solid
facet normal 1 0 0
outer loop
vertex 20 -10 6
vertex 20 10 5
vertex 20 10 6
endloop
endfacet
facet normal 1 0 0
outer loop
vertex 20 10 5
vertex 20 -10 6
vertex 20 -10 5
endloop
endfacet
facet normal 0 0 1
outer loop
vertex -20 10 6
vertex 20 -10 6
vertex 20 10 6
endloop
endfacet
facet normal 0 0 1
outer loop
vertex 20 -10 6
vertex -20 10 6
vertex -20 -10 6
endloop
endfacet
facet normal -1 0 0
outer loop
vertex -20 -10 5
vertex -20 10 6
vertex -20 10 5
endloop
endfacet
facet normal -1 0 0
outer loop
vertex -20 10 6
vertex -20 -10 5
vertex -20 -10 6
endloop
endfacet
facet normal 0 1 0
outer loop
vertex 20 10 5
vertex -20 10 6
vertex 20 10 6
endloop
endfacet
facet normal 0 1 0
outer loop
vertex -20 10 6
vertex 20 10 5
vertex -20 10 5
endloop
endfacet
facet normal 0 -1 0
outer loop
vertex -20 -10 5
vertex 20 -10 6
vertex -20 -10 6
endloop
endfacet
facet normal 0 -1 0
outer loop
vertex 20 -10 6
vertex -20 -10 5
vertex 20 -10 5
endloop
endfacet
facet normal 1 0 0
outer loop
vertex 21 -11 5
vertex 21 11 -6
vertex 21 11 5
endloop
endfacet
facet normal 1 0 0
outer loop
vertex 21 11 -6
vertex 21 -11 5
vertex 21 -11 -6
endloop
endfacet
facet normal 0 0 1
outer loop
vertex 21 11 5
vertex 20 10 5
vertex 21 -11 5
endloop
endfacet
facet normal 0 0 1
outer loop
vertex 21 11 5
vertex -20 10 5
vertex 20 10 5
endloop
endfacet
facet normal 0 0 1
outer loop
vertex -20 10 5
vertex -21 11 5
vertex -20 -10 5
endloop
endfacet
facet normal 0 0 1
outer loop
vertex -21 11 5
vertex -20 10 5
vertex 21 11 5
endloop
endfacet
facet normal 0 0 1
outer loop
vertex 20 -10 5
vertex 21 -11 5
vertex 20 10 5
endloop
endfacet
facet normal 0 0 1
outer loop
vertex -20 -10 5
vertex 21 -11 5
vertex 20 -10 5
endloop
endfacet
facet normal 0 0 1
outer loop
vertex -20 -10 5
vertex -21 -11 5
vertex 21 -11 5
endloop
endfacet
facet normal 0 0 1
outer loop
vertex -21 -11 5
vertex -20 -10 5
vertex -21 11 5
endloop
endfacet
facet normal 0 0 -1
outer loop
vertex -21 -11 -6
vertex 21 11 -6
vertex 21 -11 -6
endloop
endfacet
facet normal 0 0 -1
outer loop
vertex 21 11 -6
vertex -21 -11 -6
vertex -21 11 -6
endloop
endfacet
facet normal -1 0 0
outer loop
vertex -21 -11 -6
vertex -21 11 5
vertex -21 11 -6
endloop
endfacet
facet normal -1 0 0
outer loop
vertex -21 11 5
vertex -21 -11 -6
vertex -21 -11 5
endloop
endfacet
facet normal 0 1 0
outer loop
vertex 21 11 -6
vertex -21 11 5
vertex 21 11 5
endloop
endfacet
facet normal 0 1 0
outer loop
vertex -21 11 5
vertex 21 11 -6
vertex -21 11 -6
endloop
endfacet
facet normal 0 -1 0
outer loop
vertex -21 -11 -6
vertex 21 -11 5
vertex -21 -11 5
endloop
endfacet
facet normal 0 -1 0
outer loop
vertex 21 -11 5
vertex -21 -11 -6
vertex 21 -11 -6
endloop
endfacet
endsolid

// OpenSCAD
// Unit of length: Unit.MM
union()
{
   color(c = [1.0, 0.0, 0.0, 1.0])
   {
      translate(v = [0.0, 0.0, 0.5])
      {
         cube(size = [40.0, 20.0, 11.0], center = true);
      }
   }
   translate(v = [0.0, 0.0, -0.5])
   {
      cube(size = [42.0, 22.0, 11.0], center = true);
   }
}
